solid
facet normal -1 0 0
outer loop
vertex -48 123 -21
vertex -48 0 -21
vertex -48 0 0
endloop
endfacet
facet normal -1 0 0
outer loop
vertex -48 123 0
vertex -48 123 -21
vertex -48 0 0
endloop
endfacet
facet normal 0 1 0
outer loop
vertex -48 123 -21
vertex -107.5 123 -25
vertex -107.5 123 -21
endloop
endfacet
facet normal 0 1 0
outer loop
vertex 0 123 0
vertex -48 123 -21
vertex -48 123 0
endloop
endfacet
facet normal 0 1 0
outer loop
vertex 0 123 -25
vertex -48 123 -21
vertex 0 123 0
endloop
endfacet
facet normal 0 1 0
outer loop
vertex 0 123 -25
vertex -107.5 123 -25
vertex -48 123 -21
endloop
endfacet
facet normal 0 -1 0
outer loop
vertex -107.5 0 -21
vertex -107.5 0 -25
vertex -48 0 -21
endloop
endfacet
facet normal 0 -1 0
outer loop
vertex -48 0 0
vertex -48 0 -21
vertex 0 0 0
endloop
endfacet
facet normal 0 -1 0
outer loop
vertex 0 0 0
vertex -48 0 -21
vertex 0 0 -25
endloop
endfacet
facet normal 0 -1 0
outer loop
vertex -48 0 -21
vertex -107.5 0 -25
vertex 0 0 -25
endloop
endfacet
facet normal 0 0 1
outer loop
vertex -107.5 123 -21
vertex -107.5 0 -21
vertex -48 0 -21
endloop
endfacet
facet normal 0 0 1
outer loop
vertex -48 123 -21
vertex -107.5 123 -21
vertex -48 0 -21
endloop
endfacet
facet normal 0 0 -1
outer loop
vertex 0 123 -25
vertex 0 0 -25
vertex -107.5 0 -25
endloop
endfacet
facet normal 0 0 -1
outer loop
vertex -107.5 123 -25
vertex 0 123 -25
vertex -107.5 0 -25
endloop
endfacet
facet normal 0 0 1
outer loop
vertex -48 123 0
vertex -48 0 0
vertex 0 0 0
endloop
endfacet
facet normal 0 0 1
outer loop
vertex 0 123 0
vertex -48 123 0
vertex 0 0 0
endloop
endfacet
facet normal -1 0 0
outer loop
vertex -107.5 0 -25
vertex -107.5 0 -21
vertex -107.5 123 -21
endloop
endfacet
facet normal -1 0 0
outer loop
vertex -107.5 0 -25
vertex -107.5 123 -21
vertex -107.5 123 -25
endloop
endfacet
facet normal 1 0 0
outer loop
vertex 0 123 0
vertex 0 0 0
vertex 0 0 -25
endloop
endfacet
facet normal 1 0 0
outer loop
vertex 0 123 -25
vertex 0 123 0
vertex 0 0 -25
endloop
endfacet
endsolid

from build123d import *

# Parameters (mm, degrees)
SKETCH1_W           = 59.5
SKETCH1_H           = 4
SKETCH1_W_2         = 4
SKETCH1_W_3         = 44
BOSS_EXTRUDE1_DEPTH = 123


with BuildPart() as part:
    # Sketch1 → Boss-Extrude1 (new body)
    with BuildSketch(Plane(origin=(0, 0, 0), x_dir=(1, 0, 0), z_dir=(0, 1, 0))):
        with Locations((-77.75, 23)):
            Rectangle(SKETCH1_W, SKETCH1_H)
        with Locations((-46, 23)):
            Rectangle(SKETCH1_W_2, SKETCH1_H)
        Polygon((-48, 0), (-44, 0), (-44, 4), (-44, 21), (-48, 21), align=None)
        with Locations((-22, 2)):
            Rectangle(SKETCH1_W_3, SKETCH1_H)
        Polygon((-44, 4), (0, 4), (0, 25), (-44, 25), (-44, 21), align=None)
    extrude(amount=BOSS_EXTRUDE1_DEPTH)


solid = part.part
